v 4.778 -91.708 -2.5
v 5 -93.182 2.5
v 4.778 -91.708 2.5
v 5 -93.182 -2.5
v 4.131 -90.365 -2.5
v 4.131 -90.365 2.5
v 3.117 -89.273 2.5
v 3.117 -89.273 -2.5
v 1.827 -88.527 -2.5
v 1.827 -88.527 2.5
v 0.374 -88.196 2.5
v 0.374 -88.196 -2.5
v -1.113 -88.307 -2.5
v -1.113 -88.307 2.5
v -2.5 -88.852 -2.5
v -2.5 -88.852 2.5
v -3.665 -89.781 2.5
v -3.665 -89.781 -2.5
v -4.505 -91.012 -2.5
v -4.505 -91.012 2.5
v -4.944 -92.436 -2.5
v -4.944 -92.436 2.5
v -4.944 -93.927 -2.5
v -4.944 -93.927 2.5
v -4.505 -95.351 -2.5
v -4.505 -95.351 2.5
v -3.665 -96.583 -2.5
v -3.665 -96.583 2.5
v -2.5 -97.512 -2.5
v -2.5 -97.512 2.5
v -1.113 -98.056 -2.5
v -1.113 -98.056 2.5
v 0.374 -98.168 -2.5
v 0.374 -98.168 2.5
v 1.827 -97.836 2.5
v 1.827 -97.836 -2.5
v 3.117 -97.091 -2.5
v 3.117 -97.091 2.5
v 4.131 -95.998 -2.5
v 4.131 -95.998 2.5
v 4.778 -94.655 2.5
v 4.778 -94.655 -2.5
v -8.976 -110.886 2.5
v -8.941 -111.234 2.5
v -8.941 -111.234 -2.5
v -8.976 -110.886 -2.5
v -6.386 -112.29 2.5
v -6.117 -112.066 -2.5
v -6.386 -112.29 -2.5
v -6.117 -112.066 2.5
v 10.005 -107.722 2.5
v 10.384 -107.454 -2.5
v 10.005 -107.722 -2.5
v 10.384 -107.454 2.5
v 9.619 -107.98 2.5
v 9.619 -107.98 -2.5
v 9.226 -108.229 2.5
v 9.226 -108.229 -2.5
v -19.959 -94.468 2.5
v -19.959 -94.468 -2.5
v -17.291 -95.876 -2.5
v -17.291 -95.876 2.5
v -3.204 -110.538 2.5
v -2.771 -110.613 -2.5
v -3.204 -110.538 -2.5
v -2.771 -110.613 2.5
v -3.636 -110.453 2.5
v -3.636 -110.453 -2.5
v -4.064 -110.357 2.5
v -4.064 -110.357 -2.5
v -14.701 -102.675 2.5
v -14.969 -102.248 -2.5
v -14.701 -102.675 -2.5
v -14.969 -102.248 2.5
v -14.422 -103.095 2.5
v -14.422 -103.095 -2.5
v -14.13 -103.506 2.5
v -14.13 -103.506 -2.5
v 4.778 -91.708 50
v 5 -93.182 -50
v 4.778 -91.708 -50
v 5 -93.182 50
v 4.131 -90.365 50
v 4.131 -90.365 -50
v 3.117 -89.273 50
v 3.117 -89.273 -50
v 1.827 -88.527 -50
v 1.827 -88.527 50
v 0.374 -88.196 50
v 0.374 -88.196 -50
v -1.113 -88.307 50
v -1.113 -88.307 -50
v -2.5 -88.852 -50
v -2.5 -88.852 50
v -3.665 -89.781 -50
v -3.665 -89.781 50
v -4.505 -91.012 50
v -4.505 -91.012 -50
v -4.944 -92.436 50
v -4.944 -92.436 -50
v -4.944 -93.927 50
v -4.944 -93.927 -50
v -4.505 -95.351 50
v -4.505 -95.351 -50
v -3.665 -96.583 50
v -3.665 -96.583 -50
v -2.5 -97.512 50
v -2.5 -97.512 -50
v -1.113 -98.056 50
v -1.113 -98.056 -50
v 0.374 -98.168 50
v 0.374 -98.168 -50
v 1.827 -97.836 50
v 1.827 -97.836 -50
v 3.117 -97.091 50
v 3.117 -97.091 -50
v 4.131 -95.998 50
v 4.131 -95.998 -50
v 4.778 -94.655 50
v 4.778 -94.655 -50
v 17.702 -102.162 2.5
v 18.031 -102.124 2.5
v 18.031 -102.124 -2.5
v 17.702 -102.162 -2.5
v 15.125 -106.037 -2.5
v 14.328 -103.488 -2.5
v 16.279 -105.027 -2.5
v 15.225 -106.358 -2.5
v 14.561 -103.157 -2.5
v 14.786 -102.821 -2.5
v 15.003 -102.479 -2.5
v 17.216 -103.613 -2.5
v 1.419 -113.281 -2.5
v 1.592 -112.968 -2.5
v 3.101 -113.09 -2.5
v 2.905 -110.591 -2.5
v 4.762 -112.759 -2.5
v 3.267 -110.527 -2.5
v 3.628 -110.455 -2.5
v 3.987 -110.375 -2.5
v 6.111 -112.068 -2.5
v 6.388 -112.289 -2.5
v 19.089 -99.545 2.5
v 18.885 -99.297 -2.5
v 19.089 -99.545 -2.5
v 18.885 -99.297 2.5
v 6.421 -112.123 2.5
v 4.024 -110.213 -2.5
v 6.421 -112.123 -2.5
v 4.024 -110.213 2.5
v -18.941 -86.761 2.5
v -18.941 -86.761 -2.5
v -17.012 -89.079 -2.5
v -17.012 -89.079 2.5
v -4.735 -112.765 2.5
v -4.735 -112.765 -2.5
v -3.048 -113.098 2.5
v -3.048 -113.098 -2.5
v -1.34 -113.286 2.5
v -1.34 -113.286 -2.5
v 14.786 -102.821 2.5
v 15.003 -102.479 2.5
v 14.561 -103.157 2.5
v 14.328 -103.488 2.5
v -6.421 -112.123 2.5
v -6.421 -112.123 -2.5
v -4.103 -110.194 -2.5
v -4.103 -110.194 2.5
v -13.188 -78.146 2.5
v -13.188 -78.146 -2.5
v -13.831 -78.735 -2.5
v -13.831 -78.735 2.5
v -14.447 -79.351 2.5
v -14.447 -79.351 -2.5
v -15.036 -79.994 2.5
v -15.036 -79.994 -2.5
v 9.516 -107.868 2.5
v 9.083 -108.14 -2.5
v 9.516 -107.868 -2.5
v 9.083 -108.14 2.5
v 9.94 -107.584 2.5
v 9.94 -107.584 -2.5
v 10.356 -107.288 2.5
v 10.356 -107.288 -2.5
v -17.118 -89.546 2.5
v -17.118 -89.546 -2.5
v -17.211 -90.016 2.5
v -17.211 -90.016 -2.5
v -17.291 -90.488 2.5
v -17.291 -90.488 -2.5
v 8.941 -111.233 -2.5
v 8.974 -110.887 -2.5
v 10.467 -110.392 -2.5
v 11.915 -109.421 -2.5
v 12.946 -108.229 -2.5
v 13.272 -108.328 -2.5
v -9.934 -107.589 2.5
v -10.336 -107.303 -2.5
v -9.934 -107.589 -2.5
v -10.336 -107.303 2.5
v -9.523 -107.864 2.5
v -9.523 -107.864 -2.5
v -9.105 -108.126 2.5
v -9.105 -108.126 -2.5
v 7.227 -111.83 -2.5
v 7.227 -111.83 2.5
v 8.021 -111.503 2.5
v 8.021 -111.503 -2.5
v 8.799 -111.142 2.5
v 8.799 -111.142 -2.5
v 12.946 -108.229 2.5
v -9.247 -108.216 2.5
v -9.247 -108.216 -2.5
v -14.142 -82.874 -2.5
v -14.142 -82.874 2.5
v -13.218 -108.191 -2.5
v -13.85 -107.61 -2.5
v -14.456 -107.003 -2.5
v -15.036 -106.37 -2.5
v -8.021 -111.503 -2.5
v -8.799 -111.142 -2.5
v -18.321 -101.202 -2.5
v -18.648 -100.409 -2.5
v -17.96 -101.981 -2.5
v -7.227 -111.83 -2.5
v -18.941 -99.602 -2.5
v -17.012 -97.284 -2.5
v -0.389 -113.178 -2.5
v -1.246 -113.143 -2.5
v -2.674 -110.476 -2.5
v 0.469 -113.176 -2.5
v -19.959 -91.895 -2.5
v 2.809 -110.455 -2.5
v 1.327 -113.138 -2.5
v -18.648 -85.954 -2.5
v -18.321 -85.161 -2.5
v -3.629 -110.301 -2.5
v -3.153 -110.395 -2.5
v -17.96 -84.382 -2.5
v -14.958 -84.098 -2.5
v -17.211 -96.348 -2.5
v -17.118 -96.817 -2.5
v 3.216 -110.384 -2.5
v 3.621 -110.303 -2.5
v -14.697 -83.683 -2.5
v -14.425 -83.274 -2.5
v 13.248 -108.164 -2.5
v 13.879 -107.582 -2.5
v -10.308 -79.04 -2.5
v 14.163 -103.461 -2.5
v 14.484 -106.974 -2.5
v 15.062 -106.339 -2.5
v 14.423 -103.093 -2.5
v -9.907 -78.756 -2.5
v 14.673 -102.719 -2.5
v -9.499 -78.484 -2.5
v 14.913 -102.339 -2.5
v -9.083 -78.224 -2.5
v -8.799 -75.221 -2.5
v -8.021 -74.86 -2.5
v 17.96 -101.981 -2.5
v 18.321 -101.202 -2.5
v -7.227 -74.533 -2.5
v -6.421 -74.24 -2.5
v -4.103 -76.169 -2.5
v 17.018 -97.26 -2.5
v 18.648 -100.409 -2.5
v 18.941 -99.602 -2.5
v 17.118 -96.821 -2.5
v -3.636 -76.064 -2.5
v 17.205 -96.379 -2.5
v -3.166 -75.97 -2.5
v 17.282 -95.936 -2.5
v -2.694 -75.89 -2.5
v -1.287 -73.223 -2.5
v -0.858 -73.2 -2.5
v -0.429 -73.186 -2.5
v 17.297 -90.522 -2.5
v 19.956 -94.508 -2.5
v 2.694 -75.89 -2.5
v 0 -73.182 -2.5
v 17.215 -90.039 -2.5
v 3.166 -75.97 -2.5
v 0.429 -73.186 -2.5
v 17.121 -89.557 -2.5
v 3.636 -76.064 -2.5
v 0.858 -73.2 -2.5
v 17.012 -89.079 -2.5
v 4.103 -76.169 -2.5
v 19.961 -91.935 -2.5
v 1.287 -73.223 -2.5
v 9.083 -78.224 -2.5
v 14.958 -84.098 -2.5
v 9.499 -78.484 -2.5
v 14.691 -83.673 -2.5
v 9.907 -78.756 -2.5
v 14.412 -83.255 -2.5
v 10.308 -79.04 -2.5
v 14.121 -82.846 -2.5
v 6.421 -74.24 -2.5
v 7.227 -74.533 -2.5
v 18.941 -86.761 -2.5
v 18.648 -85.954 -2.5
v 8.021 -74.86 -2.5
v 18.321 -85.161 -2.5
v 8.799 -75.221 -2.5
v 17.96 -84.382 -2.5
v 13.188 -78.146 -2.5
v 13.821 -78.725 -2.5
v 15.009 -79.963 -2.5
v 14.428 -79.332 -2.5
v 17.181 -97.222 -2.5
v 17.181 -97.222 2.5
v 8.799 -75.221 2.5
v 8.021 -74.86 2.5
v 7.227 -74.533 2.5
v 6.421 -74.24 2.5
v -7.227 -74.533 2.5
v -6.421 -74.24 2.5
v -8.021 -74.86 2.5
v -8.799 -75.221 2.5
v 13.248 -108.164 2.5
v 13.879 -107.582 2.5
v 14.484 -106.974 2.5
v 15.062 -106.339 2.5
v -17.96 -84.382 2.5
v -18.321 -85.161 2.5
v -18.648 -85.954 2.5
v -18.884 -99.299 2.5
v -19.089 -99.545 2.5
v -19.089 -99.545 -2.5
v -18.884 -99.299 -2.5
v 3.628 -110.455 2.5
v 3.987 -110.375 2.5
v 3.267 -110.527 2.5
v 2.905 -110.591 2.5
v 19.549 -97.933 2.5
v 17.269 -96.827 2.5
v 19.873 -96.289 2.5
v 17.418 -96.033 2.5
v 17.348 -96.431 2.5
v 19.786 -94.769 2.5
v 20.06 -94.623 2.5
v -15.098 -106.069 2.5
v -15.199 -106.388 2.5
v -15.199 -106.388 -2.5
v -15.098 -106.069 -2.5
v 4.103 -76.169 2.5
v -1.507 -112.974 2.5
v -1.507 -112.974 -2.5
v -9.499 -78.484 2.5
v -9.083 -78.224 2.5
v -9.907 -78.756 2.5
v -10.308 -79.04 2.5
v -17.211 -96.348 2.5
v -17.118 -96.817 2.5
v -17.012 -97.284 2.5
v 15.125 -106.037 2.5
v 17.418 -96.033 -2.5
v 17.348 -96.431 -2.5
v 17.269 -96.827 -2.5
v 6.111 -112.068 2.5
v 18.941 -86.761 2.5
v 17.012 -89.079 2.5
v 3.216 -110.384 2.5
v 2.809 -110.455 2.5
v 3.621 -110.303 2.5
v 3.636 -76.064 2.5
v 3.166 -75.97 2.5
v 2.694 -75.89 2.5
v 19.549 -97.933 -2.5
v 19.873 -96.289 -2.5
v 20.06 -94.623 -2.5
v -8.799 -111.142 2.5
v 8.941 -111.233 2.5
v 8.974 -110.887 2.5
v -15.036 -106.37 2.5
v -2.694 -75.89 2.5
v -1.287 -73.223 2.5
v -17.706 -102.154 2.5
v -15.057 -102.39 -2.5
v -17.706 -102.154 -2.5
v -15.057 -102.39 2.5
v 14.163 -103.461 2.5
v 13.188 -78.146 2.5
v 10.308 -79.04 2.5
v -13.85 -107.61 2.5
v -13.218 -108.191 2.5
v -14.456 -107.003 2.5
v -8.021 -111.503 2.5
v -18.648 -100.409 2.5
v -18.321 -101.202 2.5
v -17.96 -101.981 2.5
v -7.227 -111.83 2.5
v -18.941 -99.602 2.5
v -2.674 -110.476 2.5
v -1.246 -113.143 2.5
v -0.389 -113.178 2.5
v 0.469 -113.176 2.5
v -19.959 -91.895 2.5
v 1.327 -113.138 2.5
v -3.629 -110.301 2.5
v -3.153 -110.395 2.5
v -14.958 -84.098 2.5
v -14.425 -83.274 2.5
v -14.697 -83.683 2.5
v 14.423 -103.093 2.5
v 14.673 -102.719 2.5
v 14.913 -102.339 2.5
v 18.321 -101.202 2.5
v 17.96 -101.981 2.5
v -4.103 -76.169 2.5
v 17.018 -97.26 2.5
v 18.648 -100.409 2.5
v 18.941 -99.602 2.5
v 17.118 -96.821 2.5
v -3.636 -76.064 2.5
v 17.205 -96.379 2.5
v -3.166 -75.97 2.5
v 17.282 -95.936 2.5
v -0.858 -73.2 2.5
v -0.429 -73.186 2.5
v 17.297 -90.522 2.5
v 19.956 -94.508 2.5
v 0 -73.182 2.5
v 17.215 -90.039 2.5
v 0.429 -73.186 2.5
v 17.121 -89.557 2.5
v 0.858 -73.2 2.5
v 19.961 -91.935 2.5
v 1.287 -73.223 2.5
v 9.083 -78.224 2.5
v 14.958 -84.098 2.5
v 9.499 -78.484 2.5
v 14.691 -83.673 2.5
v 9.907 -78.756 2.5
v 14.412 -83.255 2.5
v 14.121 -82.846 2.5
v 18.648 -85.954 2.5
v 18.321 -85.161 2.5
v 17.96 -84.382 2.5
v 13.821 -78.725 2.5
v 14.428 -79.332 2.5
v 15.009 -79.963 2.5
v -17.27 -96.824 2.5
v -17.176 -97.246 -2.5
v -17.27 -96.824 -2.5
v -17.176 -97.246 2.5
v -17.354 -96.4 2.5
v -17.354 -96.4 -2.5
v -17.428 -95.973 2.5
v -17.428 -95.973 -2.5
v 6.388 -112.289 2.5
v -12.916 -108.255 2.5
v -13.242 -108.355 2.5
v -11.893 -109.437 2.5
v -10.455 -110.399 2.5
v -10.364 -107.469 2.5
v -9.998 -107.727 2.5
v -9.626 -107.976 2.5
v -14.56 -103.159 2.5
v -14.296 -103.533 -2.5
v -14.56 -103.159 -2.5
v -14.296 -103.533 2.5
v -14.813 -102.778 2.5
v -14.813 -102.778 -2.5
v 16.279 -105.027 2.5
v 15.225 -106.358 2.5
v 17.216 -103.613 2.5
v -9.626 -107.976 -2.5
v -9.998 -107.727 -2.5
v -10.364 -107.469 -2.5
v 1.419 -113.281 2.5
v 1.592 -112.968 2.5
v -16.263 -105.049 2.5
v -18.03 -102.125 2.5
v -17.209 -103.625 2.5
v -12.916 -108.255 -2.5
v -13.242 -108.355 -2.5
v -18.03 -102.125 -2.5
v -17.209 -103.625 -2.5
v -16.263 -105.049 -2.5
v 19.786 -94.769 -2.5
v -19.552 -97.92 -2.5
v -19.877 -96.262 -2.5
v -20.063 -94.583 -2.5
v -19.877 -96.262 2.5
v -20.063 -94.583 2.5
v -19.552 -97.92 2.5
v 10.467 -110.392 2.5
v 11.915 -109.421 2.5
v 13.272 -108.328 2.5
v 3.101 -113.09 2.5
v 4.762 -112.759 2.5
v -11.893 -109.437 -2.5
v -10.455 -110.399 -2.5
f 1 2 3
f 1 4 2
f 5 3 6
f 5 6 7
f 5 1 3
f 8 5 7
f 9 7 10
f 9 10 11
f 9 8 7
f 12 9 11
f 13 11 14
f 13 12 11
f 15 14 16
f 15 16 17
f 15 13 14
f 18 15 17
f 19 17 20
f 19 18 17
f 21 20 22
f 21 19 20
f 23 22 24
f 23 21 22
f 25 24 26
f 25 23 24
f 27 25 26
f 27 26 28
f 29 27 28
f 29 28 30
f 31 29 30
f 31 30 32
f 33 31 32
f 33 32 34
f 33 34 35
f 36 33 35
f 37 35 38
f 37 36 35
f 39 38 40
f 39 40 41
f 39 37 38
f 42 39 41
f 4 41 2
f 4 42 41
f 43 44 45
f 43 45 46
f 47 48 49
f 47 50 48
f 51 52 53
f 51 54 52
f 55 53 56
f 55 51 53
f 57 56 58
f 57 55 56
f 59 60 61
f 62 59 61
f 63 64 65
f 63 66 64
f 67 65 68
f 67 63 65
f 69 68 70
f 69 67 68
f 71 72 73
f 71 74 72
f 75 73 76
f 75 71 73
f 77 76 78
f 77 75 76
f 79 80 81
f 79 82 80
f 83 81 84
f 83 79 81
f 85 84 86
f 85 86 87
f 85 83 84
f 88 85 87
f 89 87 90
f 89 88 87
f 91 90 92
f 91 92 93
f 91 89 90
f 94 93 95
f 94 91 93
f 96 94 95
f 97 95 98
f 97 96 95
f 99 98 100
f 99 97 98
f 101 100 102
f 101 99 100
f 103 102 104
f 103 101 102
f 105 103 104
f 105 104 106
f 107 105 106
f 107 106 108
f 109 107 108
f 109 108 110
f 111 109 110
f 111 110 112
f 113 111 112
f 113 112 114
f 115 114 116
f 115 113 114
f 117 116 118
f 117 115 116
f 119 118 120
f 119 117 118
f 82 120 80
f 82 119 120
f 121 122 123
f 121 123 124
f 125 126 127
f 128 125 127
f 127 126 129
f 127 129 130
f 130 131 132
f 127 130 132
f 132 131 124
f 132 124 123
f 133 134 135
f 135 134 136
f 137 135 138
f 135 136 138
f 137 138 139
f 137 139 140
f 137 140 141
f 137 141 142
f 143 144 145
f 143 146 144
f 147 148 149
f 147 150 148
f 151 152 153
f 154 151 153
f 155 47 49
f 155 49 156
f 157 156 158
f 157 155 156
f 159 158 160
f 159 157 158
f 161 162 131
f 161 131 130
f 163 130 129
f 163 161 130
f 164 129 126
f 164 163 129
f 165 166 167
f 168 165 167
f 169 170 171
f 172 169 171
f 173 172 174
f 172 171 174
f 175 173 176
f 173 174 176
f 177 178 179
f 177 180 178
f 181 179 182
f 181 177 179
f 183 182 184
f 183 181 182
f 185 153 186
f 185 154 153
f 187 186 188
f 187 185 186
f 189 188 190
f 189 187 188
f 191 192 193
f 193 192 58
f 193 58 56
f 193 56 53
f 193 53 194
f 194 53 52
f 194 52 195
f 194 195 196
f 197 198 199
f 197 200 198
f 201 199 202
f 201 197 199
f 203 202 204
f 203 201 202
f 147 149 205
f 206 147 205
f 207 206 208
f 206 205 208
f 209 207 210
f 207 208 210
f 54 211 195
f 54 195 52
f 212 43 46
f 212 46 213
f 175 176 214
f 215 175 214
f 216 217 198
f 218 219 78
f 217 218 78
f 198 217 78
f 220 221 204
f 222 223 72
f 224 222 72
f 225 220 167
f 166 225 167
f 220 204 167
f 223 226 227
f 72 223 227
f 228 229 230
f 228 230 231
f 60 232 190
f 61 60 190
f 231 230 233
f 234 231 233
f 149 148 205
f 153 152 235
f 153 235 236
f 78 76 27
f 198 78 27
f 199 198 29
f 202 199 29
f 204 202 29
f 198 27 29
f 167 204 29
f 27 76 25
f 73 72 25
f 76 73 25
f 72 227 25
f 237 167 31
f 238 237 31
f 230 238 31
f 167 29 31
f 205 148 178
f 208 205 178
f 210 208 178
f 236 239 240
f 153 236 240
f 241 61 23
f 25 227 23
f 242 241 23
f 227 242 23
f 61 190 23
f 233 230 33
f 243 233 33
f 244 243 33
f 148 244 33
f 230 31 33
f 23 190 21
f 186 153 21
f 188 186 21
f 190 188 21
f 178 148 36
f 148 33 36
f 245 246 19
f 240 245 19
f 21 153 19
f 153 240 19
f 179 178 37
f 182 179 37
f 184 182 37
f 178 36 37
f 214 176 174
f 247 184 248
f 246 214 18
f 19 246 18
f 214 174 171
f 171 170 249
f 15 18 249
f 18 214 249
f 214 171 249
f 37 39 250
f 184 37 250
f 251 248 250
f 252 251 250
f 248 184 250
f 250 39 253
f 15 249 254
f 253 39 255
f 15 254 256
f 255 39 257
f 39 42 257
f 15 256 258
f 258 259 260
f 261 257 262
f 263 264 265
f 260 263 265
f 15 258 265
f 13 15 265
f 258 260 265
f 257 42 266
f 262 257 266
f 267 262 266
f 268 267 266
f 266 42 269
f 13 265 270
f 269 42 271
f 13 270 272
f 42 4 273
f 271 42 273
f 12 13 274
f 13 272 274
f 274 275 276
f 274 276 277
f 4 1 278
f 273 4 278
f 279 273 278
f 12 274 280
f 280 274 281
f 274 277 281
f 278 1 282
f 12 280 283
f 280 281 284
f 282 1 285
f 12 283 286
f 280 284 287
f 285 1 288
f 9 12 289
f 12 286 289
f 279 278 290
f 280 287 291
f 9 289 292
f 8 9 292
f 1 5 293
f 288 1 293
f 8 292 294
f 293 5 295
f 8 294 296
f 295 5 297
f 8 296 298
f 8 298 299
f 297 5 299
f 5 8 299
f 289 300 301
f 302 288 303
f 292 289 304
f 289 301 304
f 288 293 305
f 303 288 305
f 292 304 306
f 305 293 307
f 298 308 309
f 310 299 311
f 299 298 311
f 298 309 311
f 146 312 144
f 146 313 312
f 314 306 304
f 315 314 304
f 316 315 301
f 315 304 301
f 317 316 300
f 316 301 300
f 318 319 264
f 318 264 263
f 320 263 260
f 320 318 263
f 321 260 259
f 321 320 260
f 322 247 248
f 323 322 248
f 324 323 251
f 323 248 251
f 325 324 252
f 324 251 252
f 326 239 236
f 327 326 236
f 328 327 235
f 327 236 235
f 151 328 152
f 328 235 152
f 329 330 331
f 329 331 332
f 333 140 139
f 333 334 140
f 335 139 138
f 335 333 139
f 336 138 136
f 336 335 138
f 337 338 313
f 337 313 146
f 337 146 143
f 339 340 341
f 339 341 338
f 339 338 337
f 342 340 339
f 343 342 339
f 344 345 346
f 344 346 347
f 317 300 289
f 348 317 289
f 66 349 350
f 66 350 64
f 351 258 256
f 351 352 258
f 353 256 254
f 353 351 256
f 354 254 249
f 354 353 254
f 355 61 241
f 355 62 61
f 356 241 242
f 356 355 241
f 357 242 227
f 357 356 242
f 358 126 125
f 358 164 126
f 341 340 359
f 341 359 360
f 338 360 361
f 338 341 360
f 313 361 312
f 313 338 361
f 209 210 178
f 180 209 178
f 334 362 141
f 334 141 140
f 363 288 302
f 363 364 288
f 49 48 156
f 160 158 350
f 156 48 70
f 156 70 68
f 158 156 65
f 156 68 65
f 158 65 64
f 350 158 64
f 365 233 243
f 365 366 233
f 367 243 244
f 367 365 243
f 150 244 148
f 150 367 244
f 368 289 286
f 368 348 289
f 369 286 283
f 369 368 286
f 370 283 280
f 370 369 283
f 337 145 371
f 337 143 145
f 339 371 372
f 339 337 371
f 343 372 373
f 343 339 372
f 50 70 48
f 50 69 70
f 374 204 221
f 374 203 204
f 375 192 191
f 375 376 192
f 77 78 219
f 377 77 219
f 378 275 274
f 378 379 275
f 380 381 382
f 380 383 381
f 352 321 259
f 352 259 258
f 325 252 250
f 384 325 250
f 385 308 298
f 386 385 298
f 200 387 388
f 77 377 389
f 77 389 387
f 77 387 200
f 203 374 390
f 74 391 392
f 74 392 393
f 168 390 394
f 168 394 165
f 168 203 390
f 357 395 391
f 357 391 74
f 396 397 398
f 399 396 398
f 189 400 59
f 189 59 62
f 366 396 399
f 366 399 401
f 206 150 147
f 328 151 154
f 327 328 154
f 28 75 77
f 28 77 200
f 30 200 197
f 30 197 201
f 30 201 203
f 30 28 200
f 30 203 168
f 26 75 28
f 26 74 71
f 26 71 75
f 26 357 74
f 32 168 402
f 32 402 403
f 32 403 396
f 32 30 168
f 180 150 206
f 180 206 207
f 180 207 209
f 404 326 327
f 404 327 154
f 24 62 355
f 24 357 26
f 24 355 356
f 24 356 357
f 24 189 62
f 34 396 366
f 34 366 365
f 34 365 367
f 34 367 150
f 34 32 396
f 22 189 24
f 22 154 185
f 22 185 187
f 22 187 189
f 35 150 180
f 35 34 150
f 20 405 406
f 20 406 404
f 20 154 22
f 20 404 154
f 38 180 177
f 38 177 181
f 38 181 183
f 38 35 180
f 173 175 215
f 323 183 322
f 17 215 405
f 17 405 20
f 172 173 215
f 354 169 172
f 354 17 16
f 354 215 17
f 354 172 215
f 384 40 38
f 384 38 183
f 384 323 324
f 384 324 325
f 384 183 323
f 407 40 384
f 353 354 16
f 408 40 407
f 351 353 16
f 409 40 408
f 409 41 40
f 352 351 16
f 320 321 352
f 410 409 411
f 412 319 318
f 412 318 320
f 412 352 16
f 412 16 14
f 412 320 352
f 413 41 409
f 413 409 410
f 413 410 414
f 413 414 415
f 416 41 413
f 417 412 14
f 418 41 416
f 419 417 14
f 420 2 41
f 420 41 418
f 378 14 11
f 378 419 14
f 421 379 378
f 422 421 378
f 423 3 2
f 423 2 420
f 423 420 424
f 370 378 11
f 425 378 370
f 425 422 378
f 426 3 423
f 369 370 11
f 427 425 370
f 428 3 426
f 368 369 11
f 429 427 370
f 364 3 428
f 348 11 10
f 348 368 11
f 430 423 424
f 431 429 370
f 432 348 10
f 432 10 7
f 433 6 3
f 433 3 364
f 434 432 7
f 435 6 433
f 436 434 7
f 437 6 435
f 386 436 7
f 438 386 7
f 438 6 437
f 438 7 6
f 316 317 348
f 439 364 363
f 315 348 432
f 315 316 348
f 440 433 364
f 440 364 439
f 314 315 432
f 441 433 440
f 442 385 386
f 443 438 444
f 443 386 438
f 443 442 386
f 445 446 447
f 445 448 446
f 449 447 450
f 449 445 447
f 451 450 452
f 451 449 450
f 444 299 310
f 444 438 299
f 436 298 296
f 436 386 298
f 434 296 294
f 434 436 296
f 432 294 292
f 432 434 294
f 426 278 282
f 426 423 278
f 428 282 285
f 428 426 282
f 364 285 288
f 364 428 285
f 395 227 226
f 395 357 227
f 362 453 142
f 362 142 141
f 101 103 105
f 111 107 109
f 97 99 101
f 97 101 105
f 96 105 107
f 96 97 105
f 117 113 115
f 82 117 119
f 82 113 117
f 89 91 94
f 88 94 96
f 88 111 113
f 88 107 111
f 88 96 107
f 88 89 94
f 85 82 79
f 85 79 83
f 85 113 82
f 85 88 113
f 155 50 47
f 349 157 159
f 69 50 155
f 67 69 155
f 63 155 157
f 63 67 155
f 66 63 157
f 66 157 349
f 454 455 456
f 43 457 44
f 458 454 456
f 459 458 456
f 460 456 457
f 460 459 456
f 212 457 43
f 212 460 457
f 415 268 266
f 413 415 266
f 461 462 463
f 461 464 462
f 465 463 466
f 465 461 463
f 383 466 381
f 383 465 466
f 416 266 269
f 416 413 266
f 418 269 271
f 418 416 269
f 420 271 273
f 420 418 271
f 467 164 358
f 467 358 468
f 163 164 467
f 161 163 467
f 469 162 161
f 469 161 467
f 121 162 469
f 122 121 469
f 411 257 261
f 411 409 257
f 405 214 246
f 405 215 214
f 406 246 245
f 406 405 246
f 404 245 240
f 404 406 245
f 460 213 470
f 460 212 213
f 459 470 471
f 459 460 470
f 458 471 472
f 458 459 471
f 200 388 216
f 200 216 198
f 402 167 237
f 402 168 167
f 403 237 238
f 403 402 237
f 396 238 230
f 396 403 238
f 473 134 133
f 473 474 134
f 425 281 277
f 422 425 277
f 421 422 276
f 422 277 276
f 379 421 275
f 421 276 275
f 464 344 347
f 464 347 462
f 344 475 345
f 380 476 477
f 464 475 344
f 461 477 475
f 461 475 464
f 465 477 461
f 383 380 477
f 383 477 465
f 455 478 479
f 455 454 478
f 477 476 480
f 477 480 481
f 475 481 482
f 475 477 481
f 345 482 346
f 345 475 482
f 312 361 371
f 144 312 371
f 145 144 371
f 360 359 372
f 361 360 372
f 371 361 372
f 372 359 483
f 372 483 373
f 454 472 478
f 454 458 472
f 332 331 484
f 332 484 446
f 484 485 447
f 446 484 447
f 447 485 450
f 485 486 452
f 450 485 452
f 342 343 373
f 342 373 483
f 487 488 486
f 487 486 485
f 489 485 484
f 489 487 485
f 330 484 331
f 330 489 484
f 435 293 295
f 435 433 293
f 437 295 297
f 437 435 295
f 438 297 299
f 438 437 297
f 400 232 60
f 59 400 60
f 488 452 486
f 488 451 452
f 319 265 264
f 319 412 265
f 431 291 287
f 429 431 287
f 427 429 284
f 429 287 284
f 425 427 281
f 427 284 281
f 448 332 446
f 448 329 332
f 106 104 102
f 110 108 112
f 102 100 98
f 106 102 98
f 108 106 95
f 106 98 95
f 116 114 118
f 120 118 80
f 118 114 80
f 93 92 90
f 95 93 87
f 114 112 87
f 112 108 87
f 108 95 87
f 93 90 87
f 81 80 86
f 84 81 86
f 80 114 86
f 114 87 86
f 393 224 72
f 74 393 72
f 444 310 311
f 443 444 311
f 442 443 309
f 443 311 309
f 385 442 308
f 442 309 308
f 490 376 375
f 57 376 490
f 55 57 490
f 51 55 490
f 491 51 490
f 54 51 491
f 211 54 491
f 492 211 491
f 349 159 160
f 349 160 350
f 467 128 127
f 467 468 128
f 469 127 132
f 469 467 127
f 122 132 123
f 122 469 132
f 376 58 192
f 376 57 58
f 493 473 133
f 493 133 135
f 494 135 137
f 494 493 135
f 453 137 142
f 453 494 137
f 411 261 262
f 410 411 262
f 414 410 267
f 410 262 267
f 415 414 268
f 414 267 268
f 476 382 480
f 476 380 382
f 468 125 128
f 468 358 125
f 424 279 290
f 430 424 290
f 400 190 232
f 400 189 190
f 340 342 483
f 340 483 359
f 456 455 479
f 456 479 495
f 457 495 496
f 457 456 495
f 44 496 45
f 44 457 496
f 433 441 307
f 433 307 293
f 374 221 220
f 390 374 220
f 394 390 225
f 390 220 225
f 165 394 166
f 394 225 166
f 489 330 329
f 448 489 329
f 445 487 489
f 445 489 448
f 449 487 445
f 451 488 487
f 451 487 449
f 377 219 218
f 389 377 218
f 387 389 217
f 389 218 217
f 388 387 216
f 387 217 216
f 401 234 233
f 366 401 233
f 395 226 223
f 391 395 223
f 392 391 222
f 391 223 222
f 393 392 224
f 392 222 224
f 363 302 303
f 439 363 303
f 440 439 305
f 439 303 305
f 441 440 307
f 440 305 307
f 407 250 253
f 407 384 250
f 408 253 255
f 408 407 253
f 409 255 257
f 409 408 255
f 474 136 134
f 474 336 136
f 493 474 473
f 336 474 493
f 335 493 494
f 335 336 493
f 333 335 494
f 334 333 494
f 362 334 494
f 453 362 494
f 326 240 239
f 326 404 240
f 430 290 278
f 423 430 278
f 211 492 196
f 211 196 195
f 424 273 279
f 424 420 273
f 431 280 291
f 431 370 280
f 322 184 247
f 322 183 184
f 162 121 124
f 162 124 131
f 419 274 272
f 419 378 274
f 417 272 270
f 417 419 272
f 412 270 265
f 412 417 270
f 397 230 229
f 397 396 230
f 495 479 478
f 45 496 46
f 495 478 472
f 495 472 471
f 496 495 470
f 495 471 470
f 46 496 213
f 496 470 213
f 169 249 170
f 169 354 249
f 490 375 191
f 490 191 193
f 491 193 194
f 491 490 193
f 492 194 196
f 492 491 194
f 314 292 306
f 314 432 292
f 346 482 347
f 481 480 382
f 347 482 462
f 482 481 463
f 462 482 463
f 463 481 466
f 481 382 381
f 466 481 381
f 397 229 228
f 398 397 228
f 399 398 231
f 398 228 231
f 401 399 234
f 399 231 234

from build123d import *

# Parameters (mm, degrees)
F0_R     = 5
F1_DEPTH = 50
F2_DEPTH = 2.5
F3_DEPTH = 2.5


# Not quite as in the source:
# - a feature names something its author has since deleted; it is built from what else it names
# - the program builds the solid bodies; features that only make, move or delete a surface that nothing else refers to are left out


with BuildPart() as f1:
    # F0 (on Top) → F1 (new body, symmetric)
    with BuildSketch(Plane.XY):
        with Locations((0, -93.1816846132)):
            Circle(F0_R)
    extrude(amount=F1_DEPTH, both=True)


with BuildPart() as f2:
    # F0 (on Top) → F2 (new body, symmetric)
    with BuildSketch(Plane.XY):
        with BuildLine():
            Line((-4.1026274762, -76.169381777), (-6.4206619181, -74.2403250914))
            ThreePointArc((-6.4206619181, -74.2403250914), (-7.6258193304, -74.6925829709), (-8.7993878999, -75.2214292535))
            Line((-8.7993878999, -75.2214292535), (-9.0834852771, -78.2237337101))
            ThreePointArc((-9.0834852771, -78.2237337101), (-9.7042014816, -78.6187702893), (-10.307764064, -79.0395489895))
            Line((-10.307764064, -79.0395489895), (-13.1880158888, -78.1458528465))
            ThreePointArc((-13.1880158888, -78.1458528465), (-14.1421356237, -79.0395489895), (-15.0358317667, -79.9936687244))
            Line((-15.0358317667, -79.9936687244), (-14.1421356237, -82.8739205492))
            ThreePointArc((-14.1421356237, -82.8739205492), (-14.5629143239, -83.4774831316), (-14.9579509031, -84.0981993361))
            Line((-14.9579509031, -84.0981993361), (-17.9602553597, -84.3822967133))
            ThreePointArc((-17.9602553597, -84.3822967133), (-18.4891016423, -85.5558652828), (-18.9413595218, -86.7610226951))
            Line((-18.9413595218, -86.7610226951), (-17.0123028362, -89.079057137))
            ThreePointArc((-17.0123028362, -89.079057137), (-17.1663095757, -89.7805354617), (-17.2914046111, -90.4877420425))
            Line((-17.2914046111, -90.4877420425), (-19.9585764606, -91.8951288747))
            Line((-19.9585764606, -91.8951288747), (-19.9585764606, -93.1816846132))
            Line((-19.9585764606, -93.1816846132), (-19.9585764606, -94.4682403517))
            Line((-19.9585764606, -94.4682403517), (-17.2914046111, -95.875627184))
            ThreePointArc((-17.2914046111, -95.875627184), (-17.1663095757, -96.5828337648), (-17.0123028362, -97.2843120894))
            Line((-17.0123028362, -97.2843120894), (-18.9413595218, -99.6023465313))
            ThreePointArc((-18.9413595218, -99.6023465313), (-18.4891016423, -100.8075039436), (-17.9602553597, -101.9810725131))
            Line((-17.9602553597, -101.9810725131), (-14.9685630672, -102.2476715812))
            ThreePointArc((-14.9685630672, -102.2476715812), (-14.5629143239, -102.8858860948), (-14.1300718682, -103.5059796981))
            Line((-14.1300718682, -103.5059796981), (-15.0358317667, -106.369700502))
            ThreePointArc((-15.0358317667, -106.369700502), (-14.1563340221, -107.3096075693), (-13.2181957315, -108.1909917793))
            Line((-13.2181957315, -108.1909917793), (-10.336154315, -107.3030837641))
            ThreePointArc((-10.336154315, -107.3030837641), (-9.7294103647, -107.727769102), (-9.1052409735, -108.1264023026))
            Line((-9.1052409735, -108.1264023026), (-8.7993878999, -111.141939973))
            ThreePointArc((-8.7993878999, -111.141939973), (-7.6258193304, -111.6707862556), (-6.4206619181, -112.123044135))
            Line((-6.4206619181, -112.123044135), (-4.1026274762, -110.1939874495))
            ThreePointArc((-4.1026274762, -110.1939874495), (-3.3914061607, -110.3499216879), (-2.6743139613, -110.4761358863))
            Line((-2.6743139613, -110.4761358863), (-1.2464570661, -113.142805443))
            ThreePointArc((-1.2464570661, -113.142805443), (0.0401792946, -113.1816442538), (1.3266492185, -113.1376361528))
            Line((1.3266492185, -113.1376361528), (2.8086979778, -110.4548202773))
            ThreePointArc((2.8086979778, -110.4548202773), (3.4183906996, -110.3445691326), (4.0237985116, -110.2128045276))
            Line((4.0237985116, -110.2128045276), (6.4206619181, -112.123044135))
            ThreePointArc((6.4206619181, -112.123044135), (7.6258193304, -111.6707862556), (8.7993878999, -111.141939973))
            Line((8.7993878999, -111.141939973), (9.0834852771, -108.1396355164))
            ThreePointArc((9.0834852771, -108.1396355164), (9.7291988524, -107.7279105736), (10.3562811803, -107.2883298599))
            Line((10.3562811803, -107.2883298599), (13.2483222263, -108.1644066019))
            ThreePointArc((13.2483222263, -108.1644066019), (14.184687954, -107.2811394838), (15.0622956837, -106.3394674332))
            Line((15.0622956837, -106.3394674332), (14.1628150198, -103.4610168248))
            ThreePointArc((14.1628150198, -103.4610168248), (14.5487834975, -102.9070585774), (14.9130966677, -102.3386244831))
            Line((14.9130966677, -102.3386244831), (17.9602553597, -101.9810725131))
            ThreePointArc((17.9602553597, -101.9810725131), (18.4891016423, -100.8075039436), (18.9413595218, -99.6023465313))
            Line((18.9413595218, -99.6023465313), (17.0182547654, -97.259552284))
            ThreePointArc((17.0182547654, -97.259552284), (17.1628845194, -96.6000753129), (17.2819687479, -95.9355103516))
            Line((17.2819687479, -95.9355103516), (19.9559515396, -94.5083338317))
            Line((19.9559515396, -94.5083338317), (19.9585361847, -93.2217806894))
            Line((19.9585361847, -93.2217806894), (19.9611208298, -91.9352275472))
            Line((19.9611208298, -91.9352275472), (17.2967817532, -90.5224853008))
            ThreePointArc((17.2967817532, -90.5224853008), (17.1697173115, -89.7977804415), (17.0123028362, -89.079057137))
            Line((17.0123028362, -89.079057137), (18.9413595218, -86.7610226951))
            ThreePointArc((18.9413595218, -86.7610226951), (18.4891016423, -85.5558652828), (17.9602553597, -84.3822967133))
            Line((17.9602553597, -84.3822967133), (14.9579509031, -84.0981993361))
            ThreePointArc((14.9579509031, -84.0981993361), (14.5531592728, -83.4628598293), (14.1213991508, -82.8455302983))
            Line((14.1213991508, -82.8455302983), (15.009307166, -79.9634888818))
            ThreePointArc((15.009307166, -79.9634888818), (14.1279229561, -79.0253505911), (13.1880158888, -78.1458528465))
            Line((13.1880158888, -78.1458528465), (10.307764064, -79.0395489895))
            ThreePointArc((10.307764064, -79.0395489895), (9.7042014816, -78.6187702893), (9.0834852771, -78.2237337101))
            Line((9.0834852771, -78.2237337101), (8.7993878999, -75.2214292535))
            ThreePointArc((8.7993878999, -75.2214292535), (7.6258193304, -74.6925829709), (6.4206619181, -74.2403250914))
            Line((6.4206619181, -74.2403250914), (4.1026274762, -76.169381777))
            ThreePointArc((4.1026274762, -76.169381777), (3.4011491515, -76.0153750375), (2.6939425707, -75.8902800021))
            Line((2.6939425707, -75.8902800021), (1.2865557385, -73.2231081527))
            ThreePointArc((1.2865557385, -73.2231081527), (0.6436112138, -73.1920431806), (0, -73.1816846132))
            ThreePointArc((0, -73.1816846132), (-0.6436112138, -73.1920431806), (-1.2865557385, -73.2231081527))
            Line((-1.2865557385, -73.2231081527), (-2.6939425707, -75.8902800021))
            ThreePointArc((-2.6939425707, -75.8902800021), (-3.4011491515, -76.0153750375), (-4.1026274762, -76.169381777))
        make_face()
        with Locations((0, -93.1816846132)):
            Circle(F0_R, mode=Mode.SUBTRACT)
    extrude(amount=F2_DEPTH, both=True)


with BuildPart() as f3:
    # F0 (on Top) → F3 (new body, symmetric)
    with BuildSketch(Plane.XY):
        with BuildLine():
            Line((-17.4278441118, -95.9732339822), (-20.0625118464, -94.5829985995))
            ThreePointArc((-20.0625118464, -94.5829985995), (-19.7321928289, -97.0946799783), (-19.0886980781, -99.5448980313))
            Line((-19.0886980781, -99.5448980313), (-18.8839318475, -99.2988424443))
            Line((-18.8839318475, -99.2988424443), (-17.1756516165, -97.2461021379))
            ThreePointArc((-17.1756516165, -97.2461021379), (-17.3134493239, -96.6119864622), (-17.4278441118, -95.9732339822))
        make_face()
    extrude(amount=F3_DEPTH, both=True)


with BuildPart() as f3b:
    # F0 (on Top) → F3, piece 2 (new body, symmetric)
    with BuildSketch(Plane.XY):
        with BuildLine():
            ThreePointArc((19.0885160571, -99.5452025325), (19.7282098357, -97.1145083808), (20.0596771358, -94.6230004803))
            Line((20.0596771358, -94.6230004803), (19.7864465315, -94.768831001))
            Line((19.7864465315, -94.768831001), (17.418193425, -96.0328313668))
            ThreePointArc((17.418193425, -96.0328313668), (17.3099949581, -96.6293758046), (17.1813720516, -97.2218522365))
            Line((17.1813720516, -97.2218522365), (18.8845987244, -99.2967832239))
            Line((18.8845987244, -99.2967832239), (19.0885160571, -99.5452025325))
        make_face()
    extrude(amount=F3_DEPTH, both=True)


with BuildPart() as f3c:
    # F0 (on Top) → F3, piece 3 (new body, symmetric)
    with BuildSketch(Plane.XY):
        with BuildLine():
            Line((8.9741585505, -110.8872480979), (8.941409351, -111.2333374159))
            ThreePointArc((8.941409351, -111.2333374159), (11.2014087876, -109.9218538699), (13.2722702295, -108.3283924071))
            Line((13.2722702295, -108.3283924071), (12.9455754835, -108.2294278128))
            Line((12.9455754835, -108.2294278128), (10.3843919739, -107.4535766859))
            ThreePointArc((10.3843919739, -107.4535766859), (9.8127203562, -107.8525066492), (9.2257415735, -108.2285511448))
            Line((9.2257415735, -108.2285511448), (8.9741585505, -110.8872480979))
        make_face()
    extrude(amount=F3_DEPTH, both=True)


with BuildPart() as f3d:
    # F0 (on Top) → F3, piece 4 (new body, symmetric)
    with BuildSketch(Plane.XY):
        with BuildLine():
            Line((1.5918630958, -112.9677522338), (1.4190830131, -113.2805200467))
            ThreePointArc((1.4190830131, -113.2805200467), (3.934981449, -112.9418804335), (6.3881653122, -112.2889557361))
            Line((6.3881653122, -112.2889557361), (6.110596669, -112.0677405368))
            Line((6.110596669, -112.0677405368), (3.9871793865, -110.375430585))
            ThreePointArc((3.9871793865, -110.375430585), (3.4476911913, -110.4916795713), (2.9048323458, -110.5910053651))
            Line((2.9048323458, -110.5910053651), (1.5918630958, -112.9677522338))
        make_face()
    extrude(amount=F3_DEPTH, both=True)


with BuildPart() as f3e:
    # F0 (on Top) → F3, piece 5 (new body, symmetric)
    with BuildSketch(Plane.XY):
        with BuildLine():
            ThreePointArc((15.225181808, -106.3578138581), (16.7622505287, -104.3297570431), (18.0308773002, -102.1238148835))
            Line((18.0308773002, -102.1238148835), (17.7022509045, -102.1623757288))
            Line((17.7022509045, -102.1623757288), (15.0026577234, -102.4791445477))
            ThreePointArc((15.0026577234, -102.4791445477), (14.6741973125, -102.9893567751), (14.3283927934, -103.487976864))
            Line((14.3283927934, -103.487976864), (15.1249297653, -106.0369947843))
            Line((15.1249297653, -106.0369947843), (15.225181808, -106.3578138581))
        make_face()
    extrude(amount=F3_DEPTH, both=True)


with BuildPart() as f3f:
    # F0 (on Top) → F3, piece 6 (new body, symmetric)
    with BuildSketch(Plane.XY):
        with BuildLine():
            Line((-6.1171577311, -112.0656164414), (-6.3863106942, -112.2896041931))
            ThreePointArc((-6.3863106942, -112.2896041931), (-3.8951209972, -112.9498086087), (-1.3399510633, -113.2859671804))
            Line((-1.3399510633, -113.2859671804), (-1.5067708222, -112.9744141291))
            Line((-1.5067708222, -112.9744141291), (-2.771309172, -110.6127587475))
            ThreePointArc((-2.771309172, -110.6127587475), (-3.4202485266, -110.497122812), (-4.0644175121, -110.3573362832))
            Line((-4.0644175121, -110.3573362832), (-6.1171577311, -112.0656164414))
        make_face()
    extrude(amount=F3_DEPTH, both=True)


with BuildPart() as f3g:
    # F0 (on Top) → F3, piece 7 (new body, symmetric)
    with BuildSketch(Plane.XY):
        with BuildLine():
            Line((-12.9159771829, -108.2548406666), (-13.2417652424, -108.355210435))
            ThreePointArc((-13.2417652424, -108.355210435), (-11.1842983703, -109.9333723769), (-8.9408554374, -111.2336526744))
            Line((-8.9408554374, -111.2336526744), (-8.9760890259, -110.8862694939))
            Line((-8.9760890259, -110.8862694939), (-9.2469724028, -108.2155131802))
            ThreePointArc((-9.2469724028, -108.2155131802), (-9.8124861535, -107.8526632952), (-10.363779415, -107.4685518779))
            Line((-10.363779415, -107.4685518779), (-12.9159771829, -108.2548406666))
        make_face()
    extrude(amount=F3_DEPTH, both=True)


with BuildPart() as f3h:
    # F0 (on Top) → F3, piece 8 (new body, symmetric)
    with BuildSketch(Plane.XY):
        with BuildLine():
            Line((-17.7063489474, -102.1542933171), (-18.0301571677, -102.1254377527))
            ThreePointArc((-18.0301571677, -102.1254377527), (-16.7507329053, -104.3472406327), (-15.1990035025, -106.3881890254))
            Line((-15.1990035025, -106.3881890254), (-15.0979454061, -106.0686759034))
            Line((-15.0979454061, -106.0686759034), (-14.2959294395, -103.5329599675))
            ThreePointArc((-14.2959294395, -103.5329599675), (-14.6877393038, -102.9690649647), (-15.0573191219, -102.3903566598))
            Line((-15.0573191219, -102.3903566598), (-17.7063489474, -102.1542933171))
        make_face()
    extrude(amount=F3_DEPTH, both=True)


solid = Compound([f1.part, f2.part, f3.part, f3b.part, f3c.part, f3d.part, f3e.part, f3f.part, f3g.part, f3h.part])
